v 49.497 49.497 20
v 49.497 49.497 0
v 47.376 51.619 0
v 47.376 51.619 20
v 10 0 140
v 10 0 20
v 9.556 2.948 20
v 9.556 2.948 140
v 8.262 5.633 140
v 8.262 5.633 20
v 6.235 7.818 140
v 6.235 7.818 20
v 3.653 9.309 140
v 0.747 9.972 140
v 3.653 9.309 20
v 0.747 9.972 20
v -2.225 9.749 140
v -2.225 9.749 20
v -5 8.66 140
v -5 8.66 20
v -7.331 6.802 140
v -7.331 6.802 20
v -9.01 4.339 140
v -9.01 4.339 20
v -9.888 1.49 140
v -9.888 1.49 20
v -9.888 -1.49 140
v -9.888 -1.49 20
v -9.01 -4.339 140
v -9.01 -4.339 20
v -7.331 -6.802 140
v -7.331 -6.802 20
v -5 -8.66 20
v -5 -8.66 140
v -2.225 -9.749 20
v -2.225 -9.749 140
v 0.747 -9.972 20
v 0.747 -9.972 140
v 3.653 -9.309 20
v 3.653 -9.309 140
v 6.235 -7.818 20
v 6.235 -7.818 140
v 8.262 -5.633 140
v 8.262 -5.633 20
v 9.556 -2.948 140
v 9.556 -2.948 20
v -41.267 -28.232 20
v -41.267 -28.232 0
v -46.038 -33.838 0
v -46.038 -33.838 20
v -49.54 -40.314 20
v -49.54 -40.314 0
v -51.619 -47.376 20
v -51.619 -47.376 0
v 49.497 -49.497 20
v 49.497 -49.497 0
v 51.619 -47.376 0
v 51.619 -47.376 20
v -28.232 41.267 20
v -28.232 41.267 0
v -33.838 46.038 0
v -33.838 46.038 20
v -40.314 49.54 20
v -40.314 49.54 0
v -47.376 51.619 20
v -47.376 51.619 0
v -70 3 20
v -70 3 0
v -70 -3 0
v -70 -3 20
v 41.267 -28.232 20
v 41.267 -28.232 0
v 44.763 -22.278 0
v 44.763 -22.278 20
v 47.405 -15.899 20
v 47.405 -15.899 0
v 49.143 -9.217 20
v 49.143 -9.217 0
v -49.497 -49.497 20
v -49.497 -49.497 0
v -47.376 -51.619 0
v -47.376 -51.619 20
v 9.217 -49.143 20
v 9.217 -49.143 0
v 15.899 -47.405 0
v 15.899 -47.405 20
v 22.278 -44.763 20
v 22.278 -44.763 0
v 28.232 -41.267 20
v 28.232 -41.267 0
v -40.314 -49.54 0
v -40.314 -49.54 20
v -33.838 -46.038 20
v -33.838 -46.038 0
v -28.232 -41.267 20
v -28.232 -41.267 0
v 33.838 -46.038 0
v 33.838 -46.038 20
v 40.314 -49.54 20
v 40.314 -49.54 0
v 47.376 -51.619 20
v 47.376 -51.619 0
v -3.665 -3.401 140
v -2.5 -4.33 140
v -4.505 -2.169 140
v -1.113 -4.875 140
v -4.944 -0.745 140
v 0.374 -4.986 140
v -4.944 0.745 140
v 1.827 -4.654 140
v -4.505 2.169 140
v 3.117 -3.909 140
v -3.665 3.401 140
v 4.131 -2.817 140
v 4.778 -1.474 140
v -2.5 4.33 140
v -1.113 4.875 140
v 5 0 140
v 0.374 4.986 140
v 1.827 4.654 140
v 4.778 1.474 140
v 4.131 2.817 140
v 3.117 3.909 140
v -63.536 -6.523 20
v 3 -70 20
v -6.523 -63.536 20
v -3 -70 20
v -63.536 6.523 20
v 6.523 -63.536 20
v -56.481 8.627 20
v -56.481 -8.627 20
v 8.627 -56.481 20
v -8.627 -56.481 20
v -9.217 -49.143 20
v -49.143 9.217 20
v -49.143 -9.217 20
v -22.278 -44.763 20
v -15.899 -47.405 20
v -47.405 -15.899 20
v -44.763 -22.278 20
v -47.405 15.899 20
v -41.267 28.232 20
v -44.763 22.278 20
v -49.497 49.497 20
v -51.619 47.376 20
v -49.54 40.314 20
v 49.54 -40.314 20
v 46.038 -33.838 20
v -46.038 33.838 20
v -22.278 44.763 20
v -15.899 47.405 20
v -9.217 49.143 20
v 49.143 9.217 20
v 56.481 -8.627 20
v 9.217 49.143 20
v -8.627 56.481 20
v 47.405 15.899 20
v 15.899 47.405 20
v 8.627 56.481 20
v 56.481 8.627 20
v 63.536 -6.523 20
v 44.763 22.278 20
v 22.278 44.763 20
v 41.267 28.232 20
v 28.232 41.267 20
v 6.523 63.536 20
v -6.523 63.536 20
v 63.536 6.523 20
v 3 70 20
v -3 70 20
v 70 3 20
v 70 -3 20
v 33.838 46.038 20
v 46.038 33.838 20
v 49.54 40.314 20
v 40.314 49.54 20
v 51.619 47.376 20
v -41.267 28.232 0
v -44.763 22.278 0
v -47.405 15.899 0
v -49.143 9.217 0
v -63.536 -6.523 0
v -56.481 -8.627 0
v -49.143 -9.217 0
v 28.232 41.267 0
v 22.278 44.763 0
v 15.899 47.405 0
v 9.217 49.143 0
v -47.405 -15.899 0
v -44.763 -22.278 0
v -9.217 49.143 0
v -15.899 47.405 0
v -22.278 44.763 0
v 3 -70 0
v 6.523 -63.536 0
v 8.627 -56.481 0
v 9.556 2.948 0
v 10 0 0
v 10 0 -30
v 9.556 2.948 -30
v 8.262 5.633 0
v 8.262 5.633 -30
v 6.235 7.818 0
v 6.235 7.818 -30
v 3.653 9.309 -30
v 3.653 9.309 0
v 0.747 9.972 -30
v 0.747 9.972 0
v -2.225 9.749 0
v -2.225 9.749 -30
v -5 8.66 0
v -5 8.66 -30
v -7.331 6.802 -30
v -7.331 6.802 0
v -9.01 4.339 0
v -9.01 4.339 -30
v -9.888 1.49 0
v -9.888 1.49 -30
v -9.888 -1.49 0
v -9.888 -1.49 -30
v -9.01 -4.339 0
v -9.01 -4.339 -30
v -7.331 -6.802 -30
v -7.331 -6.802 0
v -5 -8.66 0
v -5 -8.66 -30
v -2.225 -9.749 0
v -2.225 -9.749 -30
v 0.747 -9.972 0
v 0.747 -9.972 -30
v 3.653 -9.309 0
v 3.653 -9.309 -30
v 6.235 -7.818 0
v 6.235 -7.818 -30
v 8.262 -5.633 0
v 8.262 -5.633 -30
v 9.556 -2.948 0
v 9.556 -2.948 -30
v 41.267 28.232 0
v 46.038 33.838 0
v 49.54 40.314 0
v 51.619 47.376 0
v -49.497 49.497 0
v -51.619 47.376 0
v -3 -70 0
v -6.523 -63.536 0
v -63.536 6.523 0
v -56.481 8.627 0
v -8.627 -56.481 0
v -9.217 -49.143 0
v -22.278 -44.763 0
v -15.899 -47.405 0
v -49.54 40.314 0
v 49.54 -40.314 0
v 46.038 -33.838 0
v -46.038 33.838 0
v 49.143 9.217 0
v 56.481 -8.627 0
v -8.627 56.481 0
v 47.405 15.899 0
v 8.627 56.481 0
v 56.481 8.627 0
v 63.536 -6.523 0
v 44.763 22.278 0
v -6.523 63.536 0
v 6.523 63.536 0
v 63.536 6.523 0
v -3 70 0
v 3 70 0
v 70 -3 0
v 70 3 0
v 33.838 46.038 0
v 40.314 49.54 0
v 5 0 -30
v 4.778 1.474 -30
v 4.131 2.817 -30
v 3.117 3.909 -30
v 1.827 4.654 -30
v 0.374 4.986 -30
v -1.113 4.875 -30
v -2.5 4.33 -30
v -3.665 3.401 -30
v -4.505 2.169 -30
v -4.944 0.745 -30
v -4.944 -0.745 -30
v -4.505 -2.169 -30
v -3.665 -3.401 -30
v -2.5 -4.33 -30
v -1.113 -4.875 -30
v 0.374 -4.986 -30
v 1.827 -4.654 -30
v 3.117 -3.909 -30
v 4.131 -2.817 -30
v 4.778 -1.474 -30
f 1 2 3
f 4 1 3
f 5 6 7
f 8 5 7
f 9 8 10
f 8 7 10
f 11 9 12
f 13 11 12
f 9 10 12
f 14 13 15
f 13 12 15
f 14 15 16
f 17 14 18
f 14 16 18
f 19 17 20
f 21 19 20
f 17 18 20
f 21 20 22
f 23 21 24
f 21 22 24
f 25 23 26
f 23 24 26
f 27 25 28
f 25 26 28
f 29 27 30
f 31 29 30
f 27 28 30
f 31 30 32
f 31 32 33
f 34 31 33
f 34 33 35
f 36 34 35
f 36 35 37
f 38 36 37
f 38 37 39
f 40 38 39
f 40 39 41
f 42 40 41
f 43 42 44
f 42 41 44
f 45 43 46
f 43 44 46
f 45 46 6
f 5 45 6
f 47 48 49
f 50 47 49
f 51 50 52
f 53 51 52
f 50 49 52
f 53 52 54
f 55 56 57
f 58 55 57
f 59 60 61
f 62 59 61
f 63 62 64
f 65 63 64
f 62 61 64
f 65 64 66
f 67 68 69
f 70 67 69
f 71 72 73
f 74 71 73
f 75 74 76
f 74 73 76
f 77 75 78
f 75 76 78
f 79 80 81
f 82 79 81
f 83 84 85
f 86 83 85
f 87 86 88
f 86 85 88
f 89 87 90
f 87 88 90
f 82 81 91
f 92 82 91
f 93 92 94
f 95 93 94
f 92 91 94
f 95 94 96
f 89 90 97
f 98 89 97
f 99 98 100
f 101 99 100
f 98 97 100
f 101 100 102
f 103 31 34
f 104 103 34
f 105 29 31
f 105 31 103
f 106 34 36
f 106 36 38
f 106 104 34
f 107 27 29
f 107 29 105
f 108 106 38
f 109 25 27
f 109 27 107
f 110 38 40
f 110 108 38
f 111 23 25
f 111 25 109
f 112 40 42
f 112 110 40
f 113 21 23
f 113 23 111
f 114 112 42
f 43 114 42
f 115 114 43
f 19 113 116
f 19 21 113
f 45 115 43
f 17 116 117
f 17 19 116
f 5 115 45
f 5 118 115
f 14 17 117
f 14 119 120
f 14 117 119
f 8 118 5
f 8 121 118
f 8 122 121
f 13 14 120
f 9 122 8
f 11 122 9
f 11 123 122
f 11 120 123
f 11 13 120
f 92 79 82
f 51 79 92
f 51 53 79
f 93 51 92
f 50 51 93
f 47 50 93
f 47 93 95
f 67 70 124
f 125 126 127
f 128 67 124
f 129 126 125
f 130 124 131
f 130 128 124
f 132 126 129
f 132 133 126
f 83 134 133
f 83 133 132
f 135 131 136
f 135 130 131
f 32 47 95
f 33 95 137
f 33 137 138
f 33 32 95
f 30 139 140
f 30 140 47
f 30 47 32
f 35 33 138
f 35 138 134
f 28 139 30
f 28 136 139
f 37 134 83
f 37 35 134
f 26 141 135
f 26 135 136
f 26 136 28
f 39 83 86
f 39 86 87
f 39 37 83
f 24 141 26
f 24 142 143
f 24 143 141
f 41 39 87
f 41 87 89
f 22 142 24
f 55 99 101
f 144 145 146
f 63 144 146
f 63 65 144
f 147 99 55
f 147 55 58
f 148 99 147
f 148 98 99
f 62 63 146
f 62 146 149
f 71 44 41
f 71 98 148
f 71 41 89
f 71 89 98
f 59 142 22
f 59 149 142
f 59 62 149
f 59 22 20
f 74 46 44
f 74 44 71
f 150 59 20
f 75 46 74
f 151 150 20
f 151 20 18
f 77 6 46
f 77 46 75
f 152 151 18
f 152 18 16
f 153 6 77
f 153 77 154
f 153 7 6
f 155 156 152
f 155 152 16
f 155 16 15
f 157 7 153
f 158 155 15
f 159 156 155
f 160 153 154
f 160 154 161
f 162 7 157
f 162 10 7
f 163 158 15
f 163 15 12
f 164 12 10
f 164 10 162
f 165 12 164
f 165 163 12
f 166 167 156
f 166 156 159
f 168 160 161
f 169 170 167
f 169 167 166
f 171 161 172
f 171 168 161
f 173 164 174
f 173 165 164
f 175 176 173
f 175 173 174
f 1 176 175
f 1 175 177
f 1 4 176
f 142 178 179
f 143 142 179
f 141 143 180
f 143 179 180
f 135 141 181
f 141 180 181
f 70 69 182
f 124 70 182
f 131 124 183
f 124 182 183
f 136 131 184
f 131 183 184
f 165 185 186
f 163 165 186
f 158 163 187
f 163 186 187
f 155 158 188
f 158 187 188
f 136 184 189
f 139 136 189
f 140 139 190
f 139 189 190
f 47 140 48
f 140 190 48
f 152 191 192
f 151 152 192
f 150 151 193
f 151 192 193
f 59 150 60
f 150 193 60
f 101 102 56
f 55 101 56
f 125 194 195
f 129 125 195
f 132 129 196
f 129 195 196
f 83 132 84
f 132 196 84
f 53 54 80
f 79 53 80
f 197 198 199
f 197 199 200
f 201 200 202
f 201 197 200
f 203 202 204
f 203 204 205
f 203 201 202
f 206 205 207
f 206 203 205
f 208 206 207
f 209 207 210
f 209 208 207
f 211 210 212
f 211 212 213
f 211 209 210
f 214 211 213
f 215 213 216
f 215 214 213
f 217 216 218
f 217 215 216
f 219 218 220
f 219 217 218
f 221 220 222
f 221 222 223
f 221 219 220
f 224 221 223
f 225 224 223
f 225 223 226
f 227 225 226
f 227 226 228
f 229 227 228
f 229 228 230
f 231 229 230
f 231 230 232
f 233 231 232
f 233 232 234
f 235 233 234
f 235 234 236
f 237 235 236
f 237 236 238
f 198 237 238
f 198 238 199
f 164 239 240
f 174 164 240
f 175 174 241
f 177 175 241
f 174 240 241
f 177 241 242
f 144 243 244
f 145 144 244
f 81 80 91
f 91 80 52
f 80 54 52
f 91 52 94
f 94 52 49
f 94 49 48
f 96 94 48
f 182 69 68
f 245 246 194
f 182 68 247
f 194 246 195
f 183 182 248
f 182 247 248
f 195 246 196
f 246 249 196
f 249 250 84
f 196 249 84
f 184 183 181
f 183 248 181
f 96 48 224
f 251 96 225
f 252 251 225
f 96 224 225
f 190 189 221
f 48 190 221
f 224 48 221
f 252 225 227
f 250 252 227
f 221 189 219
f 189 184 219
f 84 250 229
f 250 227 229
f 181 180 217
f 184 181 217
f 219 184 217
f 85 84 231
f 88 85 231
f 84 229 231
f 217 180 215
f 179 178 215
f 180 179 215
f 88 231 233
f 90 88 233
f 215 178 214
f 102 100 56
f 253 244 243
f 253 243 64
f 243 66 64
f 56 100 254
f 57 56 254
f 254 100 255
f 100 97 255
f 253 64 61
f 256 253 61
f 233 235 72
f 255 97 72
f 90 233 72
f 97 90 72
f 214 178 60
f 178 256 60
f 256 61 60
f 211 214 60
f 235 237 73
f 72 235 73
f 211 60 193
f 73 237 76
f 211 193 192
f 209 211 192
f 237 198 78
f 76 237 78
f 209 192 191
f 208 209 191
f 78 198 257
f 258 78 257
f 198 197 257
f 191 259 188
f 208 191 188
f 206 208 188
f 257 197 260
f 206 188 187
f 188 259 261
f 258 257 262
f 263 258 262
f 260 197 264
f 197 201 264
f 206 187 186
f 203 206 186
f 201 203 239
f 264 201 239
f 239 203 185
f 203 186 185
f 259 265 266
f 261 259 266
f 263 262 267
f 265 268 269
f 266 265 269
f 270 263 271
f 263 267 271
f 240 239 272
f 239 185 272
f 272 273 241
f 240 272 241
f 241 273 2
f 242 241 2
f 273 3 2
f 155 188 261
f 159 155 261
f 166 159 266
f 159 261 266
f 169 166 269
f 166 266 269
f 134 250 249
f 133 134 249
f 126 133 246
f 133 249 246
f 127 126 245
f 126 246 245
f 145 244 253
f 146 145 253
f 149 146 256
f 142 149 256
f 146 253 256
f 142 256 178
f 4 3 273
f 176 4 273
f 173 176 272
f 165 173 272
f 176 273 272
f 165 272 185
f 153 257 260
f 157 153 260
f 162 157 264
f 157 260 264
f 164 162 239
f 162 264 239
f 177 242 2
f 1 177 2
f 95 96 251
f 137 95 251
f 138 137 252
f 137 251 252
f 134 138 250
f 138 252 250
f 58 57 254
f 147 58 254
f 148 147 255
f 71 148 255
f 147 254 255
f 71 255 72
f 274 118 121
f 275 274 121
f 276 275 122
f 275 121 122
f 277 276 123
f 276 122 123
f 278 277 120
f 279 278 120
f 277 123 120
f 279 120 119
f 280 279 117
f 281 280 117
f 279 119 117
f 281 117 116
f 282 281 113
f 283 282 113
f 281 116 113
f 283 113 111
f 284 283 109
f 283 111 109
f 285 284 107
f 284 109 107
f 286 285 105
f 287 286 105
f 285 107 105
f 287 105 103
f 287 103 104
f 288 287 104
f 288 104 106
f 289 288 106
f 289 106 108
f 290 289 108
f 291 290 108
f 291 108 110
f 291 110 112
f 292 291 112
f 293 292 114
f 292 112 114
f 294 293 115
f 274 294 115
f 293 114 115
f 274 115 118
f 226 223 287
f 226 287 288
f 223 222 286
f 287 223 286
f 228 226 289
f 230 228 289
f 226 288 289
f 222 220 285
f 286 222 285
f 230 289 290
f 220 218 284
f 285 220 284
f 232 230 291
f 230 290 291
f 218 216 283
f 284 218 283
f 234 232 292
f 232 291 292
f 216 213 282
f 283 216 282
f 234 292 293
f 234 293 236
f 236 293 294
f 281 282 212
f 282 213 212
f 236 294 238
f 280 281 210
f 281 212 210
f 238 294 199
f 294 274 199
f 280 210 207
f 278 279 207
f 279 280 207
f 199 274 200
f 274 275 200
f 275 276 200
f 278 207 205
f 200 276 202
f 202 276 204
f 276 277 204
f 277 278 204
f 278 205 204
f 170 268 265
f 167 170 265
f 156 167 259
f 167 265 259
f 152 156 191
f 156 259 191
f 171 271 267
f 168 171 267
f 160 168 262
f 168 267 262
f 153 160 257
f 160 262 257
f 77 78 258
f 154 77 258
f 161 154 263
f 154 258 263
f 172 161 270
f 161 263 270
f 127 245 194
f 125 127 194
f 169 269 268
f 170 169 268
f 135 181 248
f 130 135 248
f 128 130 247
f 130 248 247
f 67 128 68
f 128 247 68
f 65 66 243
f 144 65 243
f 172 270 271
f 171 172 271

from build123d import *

# Parameters (mm, degrees)
F1_DEPTH      = 20
F2_R          = 10
F3_DEPTH      = 120
F3_DEPTH_BACK = 50
F4_R          = 5
F5_DEPTH      = 170


with BuildPart() as f1:
    # F0 (on Top) → F1 (new body)
    with BuildSketch(Plane.XY):
        with BuildLine():
            ThreePointArc((49.143051, -9.217405), (49.785302, -4.628578), (50, 0))
            ThreePointArc((50, 0), (49.785302, 4.628578), (49.143051, 9.217405))
            ThreePointArc((49.143051, 9.217405), (46.193977, 19.134172), (41.267074, 28.231695))
            ThreePointArc((41.267074, 28.231695), (35.355339, 35.355339), (28.231695, 41.267074))
            ThreePointArc((28.231695, 41.267074), (19.134172, 46.193977), (9.217405, 49.143051))
            ThreePointArc((9.217405, 49.143051), (4.628578, 49.785302), (0, 50))
            ThreePointArc((0, 50), (-4.628578, 49.785302), (-9.217405, 49.143051))
            ThreePointArc((-9.217405, 49.143051), (-19.134172, 46.193977), (-28.231695, 41.267074))
            ThreePointArc((-28.231695, 41.267074), (-35.355339, 35.355339), (-41.267074, 28.231695))
            ThreePointArc((-41.267074, 28.231695), (-46.193977, 19.134172), (-49.143051, 9.217405))
            ThreePointArc((-49.143051, 9.217405), (-50, 0), (-49.143051, -9.217405))
            ThreePointArc((-49.143051, -9.217405), (-46.193977, -19.134172), (-41.267074, -28.231695))
            ThreePointArc((-41.267074, -28.231695), (-35.355339, -35.355339), (-28.231695, -41.267074))
            ThreePointArc((-28.231695, -41.267074), (-19.134172, -46.193977), (-9.217405, -49.143051))
            ThreePointArc((-9.217405, -49.143051), (0, -50), (9.217405, -49.143051))
            ThreePointArc((9.217405, -49.143051), (19.134172, -46.193977), (28.231695, -41.267074))
            ThreePointArc((28.231695, -41.267074), (35.355339, -35.355339), (41.267074, -28.231695))
            ThreePointArc((41.267074, -28.231695), (46.193977, -19.134172), (49.143051, -9.217405))
        make_face()
        with BuildLine():
            ThreePointArc((49.143051, 9.217405), (49.785302, 4.628578), (50, 0))
            ThreePointArc((50, 0), (49.785302, -4.628578), (49.143051, -9.217405))
            ThreePointArc((49.143051, -9.217405), (60.063704, -7.759767), (70, -3))
            Line((70, -3), (70, 0))
            Line((70, 0), (70, 3))
            ThreePointArc((70, 3), (60.063704, 7.759767), (49.143051, 9.217405))
        make_face()
        with BuildLine():
            ThreePointArc((28.231695, 41.267074), (35.355339, 35.355339), (41.267074, 28.231695))
            ThreePointArc((41.267074, 28.231695), (47.958436, 36.984468), (51.618795, 47.376154))
            Line((51.618795, 47.376154), (49.497475, 49.497475))
            Line((49.497475, 49.497475), (47.376154, 51.618795))
            ThreePointArc((47.376154, 51.618795), (36.984468, 47.958436), (28.231695, 41.267074))
        make_face()
        with BuildLine():
            ThreePointArc((51.618795, -47.376154), (47.958436, -36.984468), (41.267074, -28.231695))
            ThreePointArc((41.267074, -28.231695), (35.355339, -35.355339), (28.231695, -41.267074))
            ThreePointArc((28.231695, -41.267074), (36.984468, -47.958436), (47.376154, -51.618795))
            Line((47.376154, -51.618795), (49.497475, -49.497475))
            Line((49.497475, -49.497475), (51.618795, -47.376154))
        make_face()
        with BuildLine():
            ThreePointArc((0, 50), (4.628578, 49.785302), (9.217405, 49.143051))
            ThreePointArc((9.217405, 49.143051), (7.759767, 60.063704), (3, 70))
            Line((3, 70), (0, 70))
            Line((0, 70), (0, 50))
        make_face()
        with BuildLine():
            ThreePointArc((3, -70), (7.759767, -60.063704), (9.217405, -49.143051))
            ThreePointArc((9.217405, -49.143051), (0, -50), (-9.217405, -49.143051))
            ThreePointArc((-9.217405, -49.143051), (-7.759767, -60.063704), (-3, -70))
            Line((-3, -70), (0, -70))
            Line((0, -70), (3, -70))
        make_face()
        with BuildLine():
            ThreePointArc((-9.217405, 49.143051), (-4.628578, 49.785302), (0, 50))
            Line((0, 50), (0, 70))
            Line((0, 70), (-3, 70))
            ThreePointArc((-3, 70), (-7.759767, 60.063704), (-9.217405, 49.143051))
        make_face()
        with BuildLine():
            ThreePointArc((-47.376154, -51.618795), (-36.984468, -47.958436), (-28.231695, -41.267074))
            ThreePointArc((-28.231695, -41.267074), (-35.355339, -35.355339), (-41.267074, -28.231695))
            ThreePointArc((-41.267074, -28.231695), (-47.958436, -36.984468), (-51.618795, -47.376154))
            Line((-51.618795, -47.376154), (-49.497475, -49.497475))
            Line((-49.497475, -49.497475), (-47.376154, -51.618795))
        make_face()
        with BuildLine():
            ThreePointArc((-41.267074, 28.231695), (-35.355339, 35.355339), (-28.231695, 41.267074))
            ThreePointArc((-28.231695, 41.267074), (-36.984468, 47.958436), (-47.376154, 51.618795))
            Line((-47.376154, 51.618795), (-49.497475, 49.497475))
            Line((-49.497475, 49.497475), (-51.618795, 47.376154))
            ThreePointArc((-51.618795, 47.376154), (-47.958436, 36.984468), (-41.267074, 28.231695))
        make_face()
        with BuildLine():
            ThreePointArc((-70, -3), (-60.063704, -7.759767), (-49.143051, -9.217405))
            ThreePointArc((-49.143051, -9.217405), (-50, 0), (-49.143051, 9.217405))
            ThreePointArc((-49.143051, 9.217405), (-60.063704, 7.759767), (-70, 3))
            Line((-70, 3), (-70, 0))
            Line((-70, 0), (-70, -3))
        make_face()
    extrude(amount=F1_DEPTH)

    # F2 (on face) → F3 (join, two sides)
    with BuildSketch(Plane.XY.offset(20)) as f3_sk:
        Circle(F2_R)
    extrude(amount=F3_DEPTH)
    extrude(f3_sk.sketch, amount=-F3_DEPTH_BACK)

    # F4 (on face) → F5 (cut, through all)
    with BuildSketch(Plane.XY.offset(140)):
        Circle(F4_R)
    extrude(amount=-F5_DEPTH, mode=Mode.SUBTRACT)


solid = f1.part
